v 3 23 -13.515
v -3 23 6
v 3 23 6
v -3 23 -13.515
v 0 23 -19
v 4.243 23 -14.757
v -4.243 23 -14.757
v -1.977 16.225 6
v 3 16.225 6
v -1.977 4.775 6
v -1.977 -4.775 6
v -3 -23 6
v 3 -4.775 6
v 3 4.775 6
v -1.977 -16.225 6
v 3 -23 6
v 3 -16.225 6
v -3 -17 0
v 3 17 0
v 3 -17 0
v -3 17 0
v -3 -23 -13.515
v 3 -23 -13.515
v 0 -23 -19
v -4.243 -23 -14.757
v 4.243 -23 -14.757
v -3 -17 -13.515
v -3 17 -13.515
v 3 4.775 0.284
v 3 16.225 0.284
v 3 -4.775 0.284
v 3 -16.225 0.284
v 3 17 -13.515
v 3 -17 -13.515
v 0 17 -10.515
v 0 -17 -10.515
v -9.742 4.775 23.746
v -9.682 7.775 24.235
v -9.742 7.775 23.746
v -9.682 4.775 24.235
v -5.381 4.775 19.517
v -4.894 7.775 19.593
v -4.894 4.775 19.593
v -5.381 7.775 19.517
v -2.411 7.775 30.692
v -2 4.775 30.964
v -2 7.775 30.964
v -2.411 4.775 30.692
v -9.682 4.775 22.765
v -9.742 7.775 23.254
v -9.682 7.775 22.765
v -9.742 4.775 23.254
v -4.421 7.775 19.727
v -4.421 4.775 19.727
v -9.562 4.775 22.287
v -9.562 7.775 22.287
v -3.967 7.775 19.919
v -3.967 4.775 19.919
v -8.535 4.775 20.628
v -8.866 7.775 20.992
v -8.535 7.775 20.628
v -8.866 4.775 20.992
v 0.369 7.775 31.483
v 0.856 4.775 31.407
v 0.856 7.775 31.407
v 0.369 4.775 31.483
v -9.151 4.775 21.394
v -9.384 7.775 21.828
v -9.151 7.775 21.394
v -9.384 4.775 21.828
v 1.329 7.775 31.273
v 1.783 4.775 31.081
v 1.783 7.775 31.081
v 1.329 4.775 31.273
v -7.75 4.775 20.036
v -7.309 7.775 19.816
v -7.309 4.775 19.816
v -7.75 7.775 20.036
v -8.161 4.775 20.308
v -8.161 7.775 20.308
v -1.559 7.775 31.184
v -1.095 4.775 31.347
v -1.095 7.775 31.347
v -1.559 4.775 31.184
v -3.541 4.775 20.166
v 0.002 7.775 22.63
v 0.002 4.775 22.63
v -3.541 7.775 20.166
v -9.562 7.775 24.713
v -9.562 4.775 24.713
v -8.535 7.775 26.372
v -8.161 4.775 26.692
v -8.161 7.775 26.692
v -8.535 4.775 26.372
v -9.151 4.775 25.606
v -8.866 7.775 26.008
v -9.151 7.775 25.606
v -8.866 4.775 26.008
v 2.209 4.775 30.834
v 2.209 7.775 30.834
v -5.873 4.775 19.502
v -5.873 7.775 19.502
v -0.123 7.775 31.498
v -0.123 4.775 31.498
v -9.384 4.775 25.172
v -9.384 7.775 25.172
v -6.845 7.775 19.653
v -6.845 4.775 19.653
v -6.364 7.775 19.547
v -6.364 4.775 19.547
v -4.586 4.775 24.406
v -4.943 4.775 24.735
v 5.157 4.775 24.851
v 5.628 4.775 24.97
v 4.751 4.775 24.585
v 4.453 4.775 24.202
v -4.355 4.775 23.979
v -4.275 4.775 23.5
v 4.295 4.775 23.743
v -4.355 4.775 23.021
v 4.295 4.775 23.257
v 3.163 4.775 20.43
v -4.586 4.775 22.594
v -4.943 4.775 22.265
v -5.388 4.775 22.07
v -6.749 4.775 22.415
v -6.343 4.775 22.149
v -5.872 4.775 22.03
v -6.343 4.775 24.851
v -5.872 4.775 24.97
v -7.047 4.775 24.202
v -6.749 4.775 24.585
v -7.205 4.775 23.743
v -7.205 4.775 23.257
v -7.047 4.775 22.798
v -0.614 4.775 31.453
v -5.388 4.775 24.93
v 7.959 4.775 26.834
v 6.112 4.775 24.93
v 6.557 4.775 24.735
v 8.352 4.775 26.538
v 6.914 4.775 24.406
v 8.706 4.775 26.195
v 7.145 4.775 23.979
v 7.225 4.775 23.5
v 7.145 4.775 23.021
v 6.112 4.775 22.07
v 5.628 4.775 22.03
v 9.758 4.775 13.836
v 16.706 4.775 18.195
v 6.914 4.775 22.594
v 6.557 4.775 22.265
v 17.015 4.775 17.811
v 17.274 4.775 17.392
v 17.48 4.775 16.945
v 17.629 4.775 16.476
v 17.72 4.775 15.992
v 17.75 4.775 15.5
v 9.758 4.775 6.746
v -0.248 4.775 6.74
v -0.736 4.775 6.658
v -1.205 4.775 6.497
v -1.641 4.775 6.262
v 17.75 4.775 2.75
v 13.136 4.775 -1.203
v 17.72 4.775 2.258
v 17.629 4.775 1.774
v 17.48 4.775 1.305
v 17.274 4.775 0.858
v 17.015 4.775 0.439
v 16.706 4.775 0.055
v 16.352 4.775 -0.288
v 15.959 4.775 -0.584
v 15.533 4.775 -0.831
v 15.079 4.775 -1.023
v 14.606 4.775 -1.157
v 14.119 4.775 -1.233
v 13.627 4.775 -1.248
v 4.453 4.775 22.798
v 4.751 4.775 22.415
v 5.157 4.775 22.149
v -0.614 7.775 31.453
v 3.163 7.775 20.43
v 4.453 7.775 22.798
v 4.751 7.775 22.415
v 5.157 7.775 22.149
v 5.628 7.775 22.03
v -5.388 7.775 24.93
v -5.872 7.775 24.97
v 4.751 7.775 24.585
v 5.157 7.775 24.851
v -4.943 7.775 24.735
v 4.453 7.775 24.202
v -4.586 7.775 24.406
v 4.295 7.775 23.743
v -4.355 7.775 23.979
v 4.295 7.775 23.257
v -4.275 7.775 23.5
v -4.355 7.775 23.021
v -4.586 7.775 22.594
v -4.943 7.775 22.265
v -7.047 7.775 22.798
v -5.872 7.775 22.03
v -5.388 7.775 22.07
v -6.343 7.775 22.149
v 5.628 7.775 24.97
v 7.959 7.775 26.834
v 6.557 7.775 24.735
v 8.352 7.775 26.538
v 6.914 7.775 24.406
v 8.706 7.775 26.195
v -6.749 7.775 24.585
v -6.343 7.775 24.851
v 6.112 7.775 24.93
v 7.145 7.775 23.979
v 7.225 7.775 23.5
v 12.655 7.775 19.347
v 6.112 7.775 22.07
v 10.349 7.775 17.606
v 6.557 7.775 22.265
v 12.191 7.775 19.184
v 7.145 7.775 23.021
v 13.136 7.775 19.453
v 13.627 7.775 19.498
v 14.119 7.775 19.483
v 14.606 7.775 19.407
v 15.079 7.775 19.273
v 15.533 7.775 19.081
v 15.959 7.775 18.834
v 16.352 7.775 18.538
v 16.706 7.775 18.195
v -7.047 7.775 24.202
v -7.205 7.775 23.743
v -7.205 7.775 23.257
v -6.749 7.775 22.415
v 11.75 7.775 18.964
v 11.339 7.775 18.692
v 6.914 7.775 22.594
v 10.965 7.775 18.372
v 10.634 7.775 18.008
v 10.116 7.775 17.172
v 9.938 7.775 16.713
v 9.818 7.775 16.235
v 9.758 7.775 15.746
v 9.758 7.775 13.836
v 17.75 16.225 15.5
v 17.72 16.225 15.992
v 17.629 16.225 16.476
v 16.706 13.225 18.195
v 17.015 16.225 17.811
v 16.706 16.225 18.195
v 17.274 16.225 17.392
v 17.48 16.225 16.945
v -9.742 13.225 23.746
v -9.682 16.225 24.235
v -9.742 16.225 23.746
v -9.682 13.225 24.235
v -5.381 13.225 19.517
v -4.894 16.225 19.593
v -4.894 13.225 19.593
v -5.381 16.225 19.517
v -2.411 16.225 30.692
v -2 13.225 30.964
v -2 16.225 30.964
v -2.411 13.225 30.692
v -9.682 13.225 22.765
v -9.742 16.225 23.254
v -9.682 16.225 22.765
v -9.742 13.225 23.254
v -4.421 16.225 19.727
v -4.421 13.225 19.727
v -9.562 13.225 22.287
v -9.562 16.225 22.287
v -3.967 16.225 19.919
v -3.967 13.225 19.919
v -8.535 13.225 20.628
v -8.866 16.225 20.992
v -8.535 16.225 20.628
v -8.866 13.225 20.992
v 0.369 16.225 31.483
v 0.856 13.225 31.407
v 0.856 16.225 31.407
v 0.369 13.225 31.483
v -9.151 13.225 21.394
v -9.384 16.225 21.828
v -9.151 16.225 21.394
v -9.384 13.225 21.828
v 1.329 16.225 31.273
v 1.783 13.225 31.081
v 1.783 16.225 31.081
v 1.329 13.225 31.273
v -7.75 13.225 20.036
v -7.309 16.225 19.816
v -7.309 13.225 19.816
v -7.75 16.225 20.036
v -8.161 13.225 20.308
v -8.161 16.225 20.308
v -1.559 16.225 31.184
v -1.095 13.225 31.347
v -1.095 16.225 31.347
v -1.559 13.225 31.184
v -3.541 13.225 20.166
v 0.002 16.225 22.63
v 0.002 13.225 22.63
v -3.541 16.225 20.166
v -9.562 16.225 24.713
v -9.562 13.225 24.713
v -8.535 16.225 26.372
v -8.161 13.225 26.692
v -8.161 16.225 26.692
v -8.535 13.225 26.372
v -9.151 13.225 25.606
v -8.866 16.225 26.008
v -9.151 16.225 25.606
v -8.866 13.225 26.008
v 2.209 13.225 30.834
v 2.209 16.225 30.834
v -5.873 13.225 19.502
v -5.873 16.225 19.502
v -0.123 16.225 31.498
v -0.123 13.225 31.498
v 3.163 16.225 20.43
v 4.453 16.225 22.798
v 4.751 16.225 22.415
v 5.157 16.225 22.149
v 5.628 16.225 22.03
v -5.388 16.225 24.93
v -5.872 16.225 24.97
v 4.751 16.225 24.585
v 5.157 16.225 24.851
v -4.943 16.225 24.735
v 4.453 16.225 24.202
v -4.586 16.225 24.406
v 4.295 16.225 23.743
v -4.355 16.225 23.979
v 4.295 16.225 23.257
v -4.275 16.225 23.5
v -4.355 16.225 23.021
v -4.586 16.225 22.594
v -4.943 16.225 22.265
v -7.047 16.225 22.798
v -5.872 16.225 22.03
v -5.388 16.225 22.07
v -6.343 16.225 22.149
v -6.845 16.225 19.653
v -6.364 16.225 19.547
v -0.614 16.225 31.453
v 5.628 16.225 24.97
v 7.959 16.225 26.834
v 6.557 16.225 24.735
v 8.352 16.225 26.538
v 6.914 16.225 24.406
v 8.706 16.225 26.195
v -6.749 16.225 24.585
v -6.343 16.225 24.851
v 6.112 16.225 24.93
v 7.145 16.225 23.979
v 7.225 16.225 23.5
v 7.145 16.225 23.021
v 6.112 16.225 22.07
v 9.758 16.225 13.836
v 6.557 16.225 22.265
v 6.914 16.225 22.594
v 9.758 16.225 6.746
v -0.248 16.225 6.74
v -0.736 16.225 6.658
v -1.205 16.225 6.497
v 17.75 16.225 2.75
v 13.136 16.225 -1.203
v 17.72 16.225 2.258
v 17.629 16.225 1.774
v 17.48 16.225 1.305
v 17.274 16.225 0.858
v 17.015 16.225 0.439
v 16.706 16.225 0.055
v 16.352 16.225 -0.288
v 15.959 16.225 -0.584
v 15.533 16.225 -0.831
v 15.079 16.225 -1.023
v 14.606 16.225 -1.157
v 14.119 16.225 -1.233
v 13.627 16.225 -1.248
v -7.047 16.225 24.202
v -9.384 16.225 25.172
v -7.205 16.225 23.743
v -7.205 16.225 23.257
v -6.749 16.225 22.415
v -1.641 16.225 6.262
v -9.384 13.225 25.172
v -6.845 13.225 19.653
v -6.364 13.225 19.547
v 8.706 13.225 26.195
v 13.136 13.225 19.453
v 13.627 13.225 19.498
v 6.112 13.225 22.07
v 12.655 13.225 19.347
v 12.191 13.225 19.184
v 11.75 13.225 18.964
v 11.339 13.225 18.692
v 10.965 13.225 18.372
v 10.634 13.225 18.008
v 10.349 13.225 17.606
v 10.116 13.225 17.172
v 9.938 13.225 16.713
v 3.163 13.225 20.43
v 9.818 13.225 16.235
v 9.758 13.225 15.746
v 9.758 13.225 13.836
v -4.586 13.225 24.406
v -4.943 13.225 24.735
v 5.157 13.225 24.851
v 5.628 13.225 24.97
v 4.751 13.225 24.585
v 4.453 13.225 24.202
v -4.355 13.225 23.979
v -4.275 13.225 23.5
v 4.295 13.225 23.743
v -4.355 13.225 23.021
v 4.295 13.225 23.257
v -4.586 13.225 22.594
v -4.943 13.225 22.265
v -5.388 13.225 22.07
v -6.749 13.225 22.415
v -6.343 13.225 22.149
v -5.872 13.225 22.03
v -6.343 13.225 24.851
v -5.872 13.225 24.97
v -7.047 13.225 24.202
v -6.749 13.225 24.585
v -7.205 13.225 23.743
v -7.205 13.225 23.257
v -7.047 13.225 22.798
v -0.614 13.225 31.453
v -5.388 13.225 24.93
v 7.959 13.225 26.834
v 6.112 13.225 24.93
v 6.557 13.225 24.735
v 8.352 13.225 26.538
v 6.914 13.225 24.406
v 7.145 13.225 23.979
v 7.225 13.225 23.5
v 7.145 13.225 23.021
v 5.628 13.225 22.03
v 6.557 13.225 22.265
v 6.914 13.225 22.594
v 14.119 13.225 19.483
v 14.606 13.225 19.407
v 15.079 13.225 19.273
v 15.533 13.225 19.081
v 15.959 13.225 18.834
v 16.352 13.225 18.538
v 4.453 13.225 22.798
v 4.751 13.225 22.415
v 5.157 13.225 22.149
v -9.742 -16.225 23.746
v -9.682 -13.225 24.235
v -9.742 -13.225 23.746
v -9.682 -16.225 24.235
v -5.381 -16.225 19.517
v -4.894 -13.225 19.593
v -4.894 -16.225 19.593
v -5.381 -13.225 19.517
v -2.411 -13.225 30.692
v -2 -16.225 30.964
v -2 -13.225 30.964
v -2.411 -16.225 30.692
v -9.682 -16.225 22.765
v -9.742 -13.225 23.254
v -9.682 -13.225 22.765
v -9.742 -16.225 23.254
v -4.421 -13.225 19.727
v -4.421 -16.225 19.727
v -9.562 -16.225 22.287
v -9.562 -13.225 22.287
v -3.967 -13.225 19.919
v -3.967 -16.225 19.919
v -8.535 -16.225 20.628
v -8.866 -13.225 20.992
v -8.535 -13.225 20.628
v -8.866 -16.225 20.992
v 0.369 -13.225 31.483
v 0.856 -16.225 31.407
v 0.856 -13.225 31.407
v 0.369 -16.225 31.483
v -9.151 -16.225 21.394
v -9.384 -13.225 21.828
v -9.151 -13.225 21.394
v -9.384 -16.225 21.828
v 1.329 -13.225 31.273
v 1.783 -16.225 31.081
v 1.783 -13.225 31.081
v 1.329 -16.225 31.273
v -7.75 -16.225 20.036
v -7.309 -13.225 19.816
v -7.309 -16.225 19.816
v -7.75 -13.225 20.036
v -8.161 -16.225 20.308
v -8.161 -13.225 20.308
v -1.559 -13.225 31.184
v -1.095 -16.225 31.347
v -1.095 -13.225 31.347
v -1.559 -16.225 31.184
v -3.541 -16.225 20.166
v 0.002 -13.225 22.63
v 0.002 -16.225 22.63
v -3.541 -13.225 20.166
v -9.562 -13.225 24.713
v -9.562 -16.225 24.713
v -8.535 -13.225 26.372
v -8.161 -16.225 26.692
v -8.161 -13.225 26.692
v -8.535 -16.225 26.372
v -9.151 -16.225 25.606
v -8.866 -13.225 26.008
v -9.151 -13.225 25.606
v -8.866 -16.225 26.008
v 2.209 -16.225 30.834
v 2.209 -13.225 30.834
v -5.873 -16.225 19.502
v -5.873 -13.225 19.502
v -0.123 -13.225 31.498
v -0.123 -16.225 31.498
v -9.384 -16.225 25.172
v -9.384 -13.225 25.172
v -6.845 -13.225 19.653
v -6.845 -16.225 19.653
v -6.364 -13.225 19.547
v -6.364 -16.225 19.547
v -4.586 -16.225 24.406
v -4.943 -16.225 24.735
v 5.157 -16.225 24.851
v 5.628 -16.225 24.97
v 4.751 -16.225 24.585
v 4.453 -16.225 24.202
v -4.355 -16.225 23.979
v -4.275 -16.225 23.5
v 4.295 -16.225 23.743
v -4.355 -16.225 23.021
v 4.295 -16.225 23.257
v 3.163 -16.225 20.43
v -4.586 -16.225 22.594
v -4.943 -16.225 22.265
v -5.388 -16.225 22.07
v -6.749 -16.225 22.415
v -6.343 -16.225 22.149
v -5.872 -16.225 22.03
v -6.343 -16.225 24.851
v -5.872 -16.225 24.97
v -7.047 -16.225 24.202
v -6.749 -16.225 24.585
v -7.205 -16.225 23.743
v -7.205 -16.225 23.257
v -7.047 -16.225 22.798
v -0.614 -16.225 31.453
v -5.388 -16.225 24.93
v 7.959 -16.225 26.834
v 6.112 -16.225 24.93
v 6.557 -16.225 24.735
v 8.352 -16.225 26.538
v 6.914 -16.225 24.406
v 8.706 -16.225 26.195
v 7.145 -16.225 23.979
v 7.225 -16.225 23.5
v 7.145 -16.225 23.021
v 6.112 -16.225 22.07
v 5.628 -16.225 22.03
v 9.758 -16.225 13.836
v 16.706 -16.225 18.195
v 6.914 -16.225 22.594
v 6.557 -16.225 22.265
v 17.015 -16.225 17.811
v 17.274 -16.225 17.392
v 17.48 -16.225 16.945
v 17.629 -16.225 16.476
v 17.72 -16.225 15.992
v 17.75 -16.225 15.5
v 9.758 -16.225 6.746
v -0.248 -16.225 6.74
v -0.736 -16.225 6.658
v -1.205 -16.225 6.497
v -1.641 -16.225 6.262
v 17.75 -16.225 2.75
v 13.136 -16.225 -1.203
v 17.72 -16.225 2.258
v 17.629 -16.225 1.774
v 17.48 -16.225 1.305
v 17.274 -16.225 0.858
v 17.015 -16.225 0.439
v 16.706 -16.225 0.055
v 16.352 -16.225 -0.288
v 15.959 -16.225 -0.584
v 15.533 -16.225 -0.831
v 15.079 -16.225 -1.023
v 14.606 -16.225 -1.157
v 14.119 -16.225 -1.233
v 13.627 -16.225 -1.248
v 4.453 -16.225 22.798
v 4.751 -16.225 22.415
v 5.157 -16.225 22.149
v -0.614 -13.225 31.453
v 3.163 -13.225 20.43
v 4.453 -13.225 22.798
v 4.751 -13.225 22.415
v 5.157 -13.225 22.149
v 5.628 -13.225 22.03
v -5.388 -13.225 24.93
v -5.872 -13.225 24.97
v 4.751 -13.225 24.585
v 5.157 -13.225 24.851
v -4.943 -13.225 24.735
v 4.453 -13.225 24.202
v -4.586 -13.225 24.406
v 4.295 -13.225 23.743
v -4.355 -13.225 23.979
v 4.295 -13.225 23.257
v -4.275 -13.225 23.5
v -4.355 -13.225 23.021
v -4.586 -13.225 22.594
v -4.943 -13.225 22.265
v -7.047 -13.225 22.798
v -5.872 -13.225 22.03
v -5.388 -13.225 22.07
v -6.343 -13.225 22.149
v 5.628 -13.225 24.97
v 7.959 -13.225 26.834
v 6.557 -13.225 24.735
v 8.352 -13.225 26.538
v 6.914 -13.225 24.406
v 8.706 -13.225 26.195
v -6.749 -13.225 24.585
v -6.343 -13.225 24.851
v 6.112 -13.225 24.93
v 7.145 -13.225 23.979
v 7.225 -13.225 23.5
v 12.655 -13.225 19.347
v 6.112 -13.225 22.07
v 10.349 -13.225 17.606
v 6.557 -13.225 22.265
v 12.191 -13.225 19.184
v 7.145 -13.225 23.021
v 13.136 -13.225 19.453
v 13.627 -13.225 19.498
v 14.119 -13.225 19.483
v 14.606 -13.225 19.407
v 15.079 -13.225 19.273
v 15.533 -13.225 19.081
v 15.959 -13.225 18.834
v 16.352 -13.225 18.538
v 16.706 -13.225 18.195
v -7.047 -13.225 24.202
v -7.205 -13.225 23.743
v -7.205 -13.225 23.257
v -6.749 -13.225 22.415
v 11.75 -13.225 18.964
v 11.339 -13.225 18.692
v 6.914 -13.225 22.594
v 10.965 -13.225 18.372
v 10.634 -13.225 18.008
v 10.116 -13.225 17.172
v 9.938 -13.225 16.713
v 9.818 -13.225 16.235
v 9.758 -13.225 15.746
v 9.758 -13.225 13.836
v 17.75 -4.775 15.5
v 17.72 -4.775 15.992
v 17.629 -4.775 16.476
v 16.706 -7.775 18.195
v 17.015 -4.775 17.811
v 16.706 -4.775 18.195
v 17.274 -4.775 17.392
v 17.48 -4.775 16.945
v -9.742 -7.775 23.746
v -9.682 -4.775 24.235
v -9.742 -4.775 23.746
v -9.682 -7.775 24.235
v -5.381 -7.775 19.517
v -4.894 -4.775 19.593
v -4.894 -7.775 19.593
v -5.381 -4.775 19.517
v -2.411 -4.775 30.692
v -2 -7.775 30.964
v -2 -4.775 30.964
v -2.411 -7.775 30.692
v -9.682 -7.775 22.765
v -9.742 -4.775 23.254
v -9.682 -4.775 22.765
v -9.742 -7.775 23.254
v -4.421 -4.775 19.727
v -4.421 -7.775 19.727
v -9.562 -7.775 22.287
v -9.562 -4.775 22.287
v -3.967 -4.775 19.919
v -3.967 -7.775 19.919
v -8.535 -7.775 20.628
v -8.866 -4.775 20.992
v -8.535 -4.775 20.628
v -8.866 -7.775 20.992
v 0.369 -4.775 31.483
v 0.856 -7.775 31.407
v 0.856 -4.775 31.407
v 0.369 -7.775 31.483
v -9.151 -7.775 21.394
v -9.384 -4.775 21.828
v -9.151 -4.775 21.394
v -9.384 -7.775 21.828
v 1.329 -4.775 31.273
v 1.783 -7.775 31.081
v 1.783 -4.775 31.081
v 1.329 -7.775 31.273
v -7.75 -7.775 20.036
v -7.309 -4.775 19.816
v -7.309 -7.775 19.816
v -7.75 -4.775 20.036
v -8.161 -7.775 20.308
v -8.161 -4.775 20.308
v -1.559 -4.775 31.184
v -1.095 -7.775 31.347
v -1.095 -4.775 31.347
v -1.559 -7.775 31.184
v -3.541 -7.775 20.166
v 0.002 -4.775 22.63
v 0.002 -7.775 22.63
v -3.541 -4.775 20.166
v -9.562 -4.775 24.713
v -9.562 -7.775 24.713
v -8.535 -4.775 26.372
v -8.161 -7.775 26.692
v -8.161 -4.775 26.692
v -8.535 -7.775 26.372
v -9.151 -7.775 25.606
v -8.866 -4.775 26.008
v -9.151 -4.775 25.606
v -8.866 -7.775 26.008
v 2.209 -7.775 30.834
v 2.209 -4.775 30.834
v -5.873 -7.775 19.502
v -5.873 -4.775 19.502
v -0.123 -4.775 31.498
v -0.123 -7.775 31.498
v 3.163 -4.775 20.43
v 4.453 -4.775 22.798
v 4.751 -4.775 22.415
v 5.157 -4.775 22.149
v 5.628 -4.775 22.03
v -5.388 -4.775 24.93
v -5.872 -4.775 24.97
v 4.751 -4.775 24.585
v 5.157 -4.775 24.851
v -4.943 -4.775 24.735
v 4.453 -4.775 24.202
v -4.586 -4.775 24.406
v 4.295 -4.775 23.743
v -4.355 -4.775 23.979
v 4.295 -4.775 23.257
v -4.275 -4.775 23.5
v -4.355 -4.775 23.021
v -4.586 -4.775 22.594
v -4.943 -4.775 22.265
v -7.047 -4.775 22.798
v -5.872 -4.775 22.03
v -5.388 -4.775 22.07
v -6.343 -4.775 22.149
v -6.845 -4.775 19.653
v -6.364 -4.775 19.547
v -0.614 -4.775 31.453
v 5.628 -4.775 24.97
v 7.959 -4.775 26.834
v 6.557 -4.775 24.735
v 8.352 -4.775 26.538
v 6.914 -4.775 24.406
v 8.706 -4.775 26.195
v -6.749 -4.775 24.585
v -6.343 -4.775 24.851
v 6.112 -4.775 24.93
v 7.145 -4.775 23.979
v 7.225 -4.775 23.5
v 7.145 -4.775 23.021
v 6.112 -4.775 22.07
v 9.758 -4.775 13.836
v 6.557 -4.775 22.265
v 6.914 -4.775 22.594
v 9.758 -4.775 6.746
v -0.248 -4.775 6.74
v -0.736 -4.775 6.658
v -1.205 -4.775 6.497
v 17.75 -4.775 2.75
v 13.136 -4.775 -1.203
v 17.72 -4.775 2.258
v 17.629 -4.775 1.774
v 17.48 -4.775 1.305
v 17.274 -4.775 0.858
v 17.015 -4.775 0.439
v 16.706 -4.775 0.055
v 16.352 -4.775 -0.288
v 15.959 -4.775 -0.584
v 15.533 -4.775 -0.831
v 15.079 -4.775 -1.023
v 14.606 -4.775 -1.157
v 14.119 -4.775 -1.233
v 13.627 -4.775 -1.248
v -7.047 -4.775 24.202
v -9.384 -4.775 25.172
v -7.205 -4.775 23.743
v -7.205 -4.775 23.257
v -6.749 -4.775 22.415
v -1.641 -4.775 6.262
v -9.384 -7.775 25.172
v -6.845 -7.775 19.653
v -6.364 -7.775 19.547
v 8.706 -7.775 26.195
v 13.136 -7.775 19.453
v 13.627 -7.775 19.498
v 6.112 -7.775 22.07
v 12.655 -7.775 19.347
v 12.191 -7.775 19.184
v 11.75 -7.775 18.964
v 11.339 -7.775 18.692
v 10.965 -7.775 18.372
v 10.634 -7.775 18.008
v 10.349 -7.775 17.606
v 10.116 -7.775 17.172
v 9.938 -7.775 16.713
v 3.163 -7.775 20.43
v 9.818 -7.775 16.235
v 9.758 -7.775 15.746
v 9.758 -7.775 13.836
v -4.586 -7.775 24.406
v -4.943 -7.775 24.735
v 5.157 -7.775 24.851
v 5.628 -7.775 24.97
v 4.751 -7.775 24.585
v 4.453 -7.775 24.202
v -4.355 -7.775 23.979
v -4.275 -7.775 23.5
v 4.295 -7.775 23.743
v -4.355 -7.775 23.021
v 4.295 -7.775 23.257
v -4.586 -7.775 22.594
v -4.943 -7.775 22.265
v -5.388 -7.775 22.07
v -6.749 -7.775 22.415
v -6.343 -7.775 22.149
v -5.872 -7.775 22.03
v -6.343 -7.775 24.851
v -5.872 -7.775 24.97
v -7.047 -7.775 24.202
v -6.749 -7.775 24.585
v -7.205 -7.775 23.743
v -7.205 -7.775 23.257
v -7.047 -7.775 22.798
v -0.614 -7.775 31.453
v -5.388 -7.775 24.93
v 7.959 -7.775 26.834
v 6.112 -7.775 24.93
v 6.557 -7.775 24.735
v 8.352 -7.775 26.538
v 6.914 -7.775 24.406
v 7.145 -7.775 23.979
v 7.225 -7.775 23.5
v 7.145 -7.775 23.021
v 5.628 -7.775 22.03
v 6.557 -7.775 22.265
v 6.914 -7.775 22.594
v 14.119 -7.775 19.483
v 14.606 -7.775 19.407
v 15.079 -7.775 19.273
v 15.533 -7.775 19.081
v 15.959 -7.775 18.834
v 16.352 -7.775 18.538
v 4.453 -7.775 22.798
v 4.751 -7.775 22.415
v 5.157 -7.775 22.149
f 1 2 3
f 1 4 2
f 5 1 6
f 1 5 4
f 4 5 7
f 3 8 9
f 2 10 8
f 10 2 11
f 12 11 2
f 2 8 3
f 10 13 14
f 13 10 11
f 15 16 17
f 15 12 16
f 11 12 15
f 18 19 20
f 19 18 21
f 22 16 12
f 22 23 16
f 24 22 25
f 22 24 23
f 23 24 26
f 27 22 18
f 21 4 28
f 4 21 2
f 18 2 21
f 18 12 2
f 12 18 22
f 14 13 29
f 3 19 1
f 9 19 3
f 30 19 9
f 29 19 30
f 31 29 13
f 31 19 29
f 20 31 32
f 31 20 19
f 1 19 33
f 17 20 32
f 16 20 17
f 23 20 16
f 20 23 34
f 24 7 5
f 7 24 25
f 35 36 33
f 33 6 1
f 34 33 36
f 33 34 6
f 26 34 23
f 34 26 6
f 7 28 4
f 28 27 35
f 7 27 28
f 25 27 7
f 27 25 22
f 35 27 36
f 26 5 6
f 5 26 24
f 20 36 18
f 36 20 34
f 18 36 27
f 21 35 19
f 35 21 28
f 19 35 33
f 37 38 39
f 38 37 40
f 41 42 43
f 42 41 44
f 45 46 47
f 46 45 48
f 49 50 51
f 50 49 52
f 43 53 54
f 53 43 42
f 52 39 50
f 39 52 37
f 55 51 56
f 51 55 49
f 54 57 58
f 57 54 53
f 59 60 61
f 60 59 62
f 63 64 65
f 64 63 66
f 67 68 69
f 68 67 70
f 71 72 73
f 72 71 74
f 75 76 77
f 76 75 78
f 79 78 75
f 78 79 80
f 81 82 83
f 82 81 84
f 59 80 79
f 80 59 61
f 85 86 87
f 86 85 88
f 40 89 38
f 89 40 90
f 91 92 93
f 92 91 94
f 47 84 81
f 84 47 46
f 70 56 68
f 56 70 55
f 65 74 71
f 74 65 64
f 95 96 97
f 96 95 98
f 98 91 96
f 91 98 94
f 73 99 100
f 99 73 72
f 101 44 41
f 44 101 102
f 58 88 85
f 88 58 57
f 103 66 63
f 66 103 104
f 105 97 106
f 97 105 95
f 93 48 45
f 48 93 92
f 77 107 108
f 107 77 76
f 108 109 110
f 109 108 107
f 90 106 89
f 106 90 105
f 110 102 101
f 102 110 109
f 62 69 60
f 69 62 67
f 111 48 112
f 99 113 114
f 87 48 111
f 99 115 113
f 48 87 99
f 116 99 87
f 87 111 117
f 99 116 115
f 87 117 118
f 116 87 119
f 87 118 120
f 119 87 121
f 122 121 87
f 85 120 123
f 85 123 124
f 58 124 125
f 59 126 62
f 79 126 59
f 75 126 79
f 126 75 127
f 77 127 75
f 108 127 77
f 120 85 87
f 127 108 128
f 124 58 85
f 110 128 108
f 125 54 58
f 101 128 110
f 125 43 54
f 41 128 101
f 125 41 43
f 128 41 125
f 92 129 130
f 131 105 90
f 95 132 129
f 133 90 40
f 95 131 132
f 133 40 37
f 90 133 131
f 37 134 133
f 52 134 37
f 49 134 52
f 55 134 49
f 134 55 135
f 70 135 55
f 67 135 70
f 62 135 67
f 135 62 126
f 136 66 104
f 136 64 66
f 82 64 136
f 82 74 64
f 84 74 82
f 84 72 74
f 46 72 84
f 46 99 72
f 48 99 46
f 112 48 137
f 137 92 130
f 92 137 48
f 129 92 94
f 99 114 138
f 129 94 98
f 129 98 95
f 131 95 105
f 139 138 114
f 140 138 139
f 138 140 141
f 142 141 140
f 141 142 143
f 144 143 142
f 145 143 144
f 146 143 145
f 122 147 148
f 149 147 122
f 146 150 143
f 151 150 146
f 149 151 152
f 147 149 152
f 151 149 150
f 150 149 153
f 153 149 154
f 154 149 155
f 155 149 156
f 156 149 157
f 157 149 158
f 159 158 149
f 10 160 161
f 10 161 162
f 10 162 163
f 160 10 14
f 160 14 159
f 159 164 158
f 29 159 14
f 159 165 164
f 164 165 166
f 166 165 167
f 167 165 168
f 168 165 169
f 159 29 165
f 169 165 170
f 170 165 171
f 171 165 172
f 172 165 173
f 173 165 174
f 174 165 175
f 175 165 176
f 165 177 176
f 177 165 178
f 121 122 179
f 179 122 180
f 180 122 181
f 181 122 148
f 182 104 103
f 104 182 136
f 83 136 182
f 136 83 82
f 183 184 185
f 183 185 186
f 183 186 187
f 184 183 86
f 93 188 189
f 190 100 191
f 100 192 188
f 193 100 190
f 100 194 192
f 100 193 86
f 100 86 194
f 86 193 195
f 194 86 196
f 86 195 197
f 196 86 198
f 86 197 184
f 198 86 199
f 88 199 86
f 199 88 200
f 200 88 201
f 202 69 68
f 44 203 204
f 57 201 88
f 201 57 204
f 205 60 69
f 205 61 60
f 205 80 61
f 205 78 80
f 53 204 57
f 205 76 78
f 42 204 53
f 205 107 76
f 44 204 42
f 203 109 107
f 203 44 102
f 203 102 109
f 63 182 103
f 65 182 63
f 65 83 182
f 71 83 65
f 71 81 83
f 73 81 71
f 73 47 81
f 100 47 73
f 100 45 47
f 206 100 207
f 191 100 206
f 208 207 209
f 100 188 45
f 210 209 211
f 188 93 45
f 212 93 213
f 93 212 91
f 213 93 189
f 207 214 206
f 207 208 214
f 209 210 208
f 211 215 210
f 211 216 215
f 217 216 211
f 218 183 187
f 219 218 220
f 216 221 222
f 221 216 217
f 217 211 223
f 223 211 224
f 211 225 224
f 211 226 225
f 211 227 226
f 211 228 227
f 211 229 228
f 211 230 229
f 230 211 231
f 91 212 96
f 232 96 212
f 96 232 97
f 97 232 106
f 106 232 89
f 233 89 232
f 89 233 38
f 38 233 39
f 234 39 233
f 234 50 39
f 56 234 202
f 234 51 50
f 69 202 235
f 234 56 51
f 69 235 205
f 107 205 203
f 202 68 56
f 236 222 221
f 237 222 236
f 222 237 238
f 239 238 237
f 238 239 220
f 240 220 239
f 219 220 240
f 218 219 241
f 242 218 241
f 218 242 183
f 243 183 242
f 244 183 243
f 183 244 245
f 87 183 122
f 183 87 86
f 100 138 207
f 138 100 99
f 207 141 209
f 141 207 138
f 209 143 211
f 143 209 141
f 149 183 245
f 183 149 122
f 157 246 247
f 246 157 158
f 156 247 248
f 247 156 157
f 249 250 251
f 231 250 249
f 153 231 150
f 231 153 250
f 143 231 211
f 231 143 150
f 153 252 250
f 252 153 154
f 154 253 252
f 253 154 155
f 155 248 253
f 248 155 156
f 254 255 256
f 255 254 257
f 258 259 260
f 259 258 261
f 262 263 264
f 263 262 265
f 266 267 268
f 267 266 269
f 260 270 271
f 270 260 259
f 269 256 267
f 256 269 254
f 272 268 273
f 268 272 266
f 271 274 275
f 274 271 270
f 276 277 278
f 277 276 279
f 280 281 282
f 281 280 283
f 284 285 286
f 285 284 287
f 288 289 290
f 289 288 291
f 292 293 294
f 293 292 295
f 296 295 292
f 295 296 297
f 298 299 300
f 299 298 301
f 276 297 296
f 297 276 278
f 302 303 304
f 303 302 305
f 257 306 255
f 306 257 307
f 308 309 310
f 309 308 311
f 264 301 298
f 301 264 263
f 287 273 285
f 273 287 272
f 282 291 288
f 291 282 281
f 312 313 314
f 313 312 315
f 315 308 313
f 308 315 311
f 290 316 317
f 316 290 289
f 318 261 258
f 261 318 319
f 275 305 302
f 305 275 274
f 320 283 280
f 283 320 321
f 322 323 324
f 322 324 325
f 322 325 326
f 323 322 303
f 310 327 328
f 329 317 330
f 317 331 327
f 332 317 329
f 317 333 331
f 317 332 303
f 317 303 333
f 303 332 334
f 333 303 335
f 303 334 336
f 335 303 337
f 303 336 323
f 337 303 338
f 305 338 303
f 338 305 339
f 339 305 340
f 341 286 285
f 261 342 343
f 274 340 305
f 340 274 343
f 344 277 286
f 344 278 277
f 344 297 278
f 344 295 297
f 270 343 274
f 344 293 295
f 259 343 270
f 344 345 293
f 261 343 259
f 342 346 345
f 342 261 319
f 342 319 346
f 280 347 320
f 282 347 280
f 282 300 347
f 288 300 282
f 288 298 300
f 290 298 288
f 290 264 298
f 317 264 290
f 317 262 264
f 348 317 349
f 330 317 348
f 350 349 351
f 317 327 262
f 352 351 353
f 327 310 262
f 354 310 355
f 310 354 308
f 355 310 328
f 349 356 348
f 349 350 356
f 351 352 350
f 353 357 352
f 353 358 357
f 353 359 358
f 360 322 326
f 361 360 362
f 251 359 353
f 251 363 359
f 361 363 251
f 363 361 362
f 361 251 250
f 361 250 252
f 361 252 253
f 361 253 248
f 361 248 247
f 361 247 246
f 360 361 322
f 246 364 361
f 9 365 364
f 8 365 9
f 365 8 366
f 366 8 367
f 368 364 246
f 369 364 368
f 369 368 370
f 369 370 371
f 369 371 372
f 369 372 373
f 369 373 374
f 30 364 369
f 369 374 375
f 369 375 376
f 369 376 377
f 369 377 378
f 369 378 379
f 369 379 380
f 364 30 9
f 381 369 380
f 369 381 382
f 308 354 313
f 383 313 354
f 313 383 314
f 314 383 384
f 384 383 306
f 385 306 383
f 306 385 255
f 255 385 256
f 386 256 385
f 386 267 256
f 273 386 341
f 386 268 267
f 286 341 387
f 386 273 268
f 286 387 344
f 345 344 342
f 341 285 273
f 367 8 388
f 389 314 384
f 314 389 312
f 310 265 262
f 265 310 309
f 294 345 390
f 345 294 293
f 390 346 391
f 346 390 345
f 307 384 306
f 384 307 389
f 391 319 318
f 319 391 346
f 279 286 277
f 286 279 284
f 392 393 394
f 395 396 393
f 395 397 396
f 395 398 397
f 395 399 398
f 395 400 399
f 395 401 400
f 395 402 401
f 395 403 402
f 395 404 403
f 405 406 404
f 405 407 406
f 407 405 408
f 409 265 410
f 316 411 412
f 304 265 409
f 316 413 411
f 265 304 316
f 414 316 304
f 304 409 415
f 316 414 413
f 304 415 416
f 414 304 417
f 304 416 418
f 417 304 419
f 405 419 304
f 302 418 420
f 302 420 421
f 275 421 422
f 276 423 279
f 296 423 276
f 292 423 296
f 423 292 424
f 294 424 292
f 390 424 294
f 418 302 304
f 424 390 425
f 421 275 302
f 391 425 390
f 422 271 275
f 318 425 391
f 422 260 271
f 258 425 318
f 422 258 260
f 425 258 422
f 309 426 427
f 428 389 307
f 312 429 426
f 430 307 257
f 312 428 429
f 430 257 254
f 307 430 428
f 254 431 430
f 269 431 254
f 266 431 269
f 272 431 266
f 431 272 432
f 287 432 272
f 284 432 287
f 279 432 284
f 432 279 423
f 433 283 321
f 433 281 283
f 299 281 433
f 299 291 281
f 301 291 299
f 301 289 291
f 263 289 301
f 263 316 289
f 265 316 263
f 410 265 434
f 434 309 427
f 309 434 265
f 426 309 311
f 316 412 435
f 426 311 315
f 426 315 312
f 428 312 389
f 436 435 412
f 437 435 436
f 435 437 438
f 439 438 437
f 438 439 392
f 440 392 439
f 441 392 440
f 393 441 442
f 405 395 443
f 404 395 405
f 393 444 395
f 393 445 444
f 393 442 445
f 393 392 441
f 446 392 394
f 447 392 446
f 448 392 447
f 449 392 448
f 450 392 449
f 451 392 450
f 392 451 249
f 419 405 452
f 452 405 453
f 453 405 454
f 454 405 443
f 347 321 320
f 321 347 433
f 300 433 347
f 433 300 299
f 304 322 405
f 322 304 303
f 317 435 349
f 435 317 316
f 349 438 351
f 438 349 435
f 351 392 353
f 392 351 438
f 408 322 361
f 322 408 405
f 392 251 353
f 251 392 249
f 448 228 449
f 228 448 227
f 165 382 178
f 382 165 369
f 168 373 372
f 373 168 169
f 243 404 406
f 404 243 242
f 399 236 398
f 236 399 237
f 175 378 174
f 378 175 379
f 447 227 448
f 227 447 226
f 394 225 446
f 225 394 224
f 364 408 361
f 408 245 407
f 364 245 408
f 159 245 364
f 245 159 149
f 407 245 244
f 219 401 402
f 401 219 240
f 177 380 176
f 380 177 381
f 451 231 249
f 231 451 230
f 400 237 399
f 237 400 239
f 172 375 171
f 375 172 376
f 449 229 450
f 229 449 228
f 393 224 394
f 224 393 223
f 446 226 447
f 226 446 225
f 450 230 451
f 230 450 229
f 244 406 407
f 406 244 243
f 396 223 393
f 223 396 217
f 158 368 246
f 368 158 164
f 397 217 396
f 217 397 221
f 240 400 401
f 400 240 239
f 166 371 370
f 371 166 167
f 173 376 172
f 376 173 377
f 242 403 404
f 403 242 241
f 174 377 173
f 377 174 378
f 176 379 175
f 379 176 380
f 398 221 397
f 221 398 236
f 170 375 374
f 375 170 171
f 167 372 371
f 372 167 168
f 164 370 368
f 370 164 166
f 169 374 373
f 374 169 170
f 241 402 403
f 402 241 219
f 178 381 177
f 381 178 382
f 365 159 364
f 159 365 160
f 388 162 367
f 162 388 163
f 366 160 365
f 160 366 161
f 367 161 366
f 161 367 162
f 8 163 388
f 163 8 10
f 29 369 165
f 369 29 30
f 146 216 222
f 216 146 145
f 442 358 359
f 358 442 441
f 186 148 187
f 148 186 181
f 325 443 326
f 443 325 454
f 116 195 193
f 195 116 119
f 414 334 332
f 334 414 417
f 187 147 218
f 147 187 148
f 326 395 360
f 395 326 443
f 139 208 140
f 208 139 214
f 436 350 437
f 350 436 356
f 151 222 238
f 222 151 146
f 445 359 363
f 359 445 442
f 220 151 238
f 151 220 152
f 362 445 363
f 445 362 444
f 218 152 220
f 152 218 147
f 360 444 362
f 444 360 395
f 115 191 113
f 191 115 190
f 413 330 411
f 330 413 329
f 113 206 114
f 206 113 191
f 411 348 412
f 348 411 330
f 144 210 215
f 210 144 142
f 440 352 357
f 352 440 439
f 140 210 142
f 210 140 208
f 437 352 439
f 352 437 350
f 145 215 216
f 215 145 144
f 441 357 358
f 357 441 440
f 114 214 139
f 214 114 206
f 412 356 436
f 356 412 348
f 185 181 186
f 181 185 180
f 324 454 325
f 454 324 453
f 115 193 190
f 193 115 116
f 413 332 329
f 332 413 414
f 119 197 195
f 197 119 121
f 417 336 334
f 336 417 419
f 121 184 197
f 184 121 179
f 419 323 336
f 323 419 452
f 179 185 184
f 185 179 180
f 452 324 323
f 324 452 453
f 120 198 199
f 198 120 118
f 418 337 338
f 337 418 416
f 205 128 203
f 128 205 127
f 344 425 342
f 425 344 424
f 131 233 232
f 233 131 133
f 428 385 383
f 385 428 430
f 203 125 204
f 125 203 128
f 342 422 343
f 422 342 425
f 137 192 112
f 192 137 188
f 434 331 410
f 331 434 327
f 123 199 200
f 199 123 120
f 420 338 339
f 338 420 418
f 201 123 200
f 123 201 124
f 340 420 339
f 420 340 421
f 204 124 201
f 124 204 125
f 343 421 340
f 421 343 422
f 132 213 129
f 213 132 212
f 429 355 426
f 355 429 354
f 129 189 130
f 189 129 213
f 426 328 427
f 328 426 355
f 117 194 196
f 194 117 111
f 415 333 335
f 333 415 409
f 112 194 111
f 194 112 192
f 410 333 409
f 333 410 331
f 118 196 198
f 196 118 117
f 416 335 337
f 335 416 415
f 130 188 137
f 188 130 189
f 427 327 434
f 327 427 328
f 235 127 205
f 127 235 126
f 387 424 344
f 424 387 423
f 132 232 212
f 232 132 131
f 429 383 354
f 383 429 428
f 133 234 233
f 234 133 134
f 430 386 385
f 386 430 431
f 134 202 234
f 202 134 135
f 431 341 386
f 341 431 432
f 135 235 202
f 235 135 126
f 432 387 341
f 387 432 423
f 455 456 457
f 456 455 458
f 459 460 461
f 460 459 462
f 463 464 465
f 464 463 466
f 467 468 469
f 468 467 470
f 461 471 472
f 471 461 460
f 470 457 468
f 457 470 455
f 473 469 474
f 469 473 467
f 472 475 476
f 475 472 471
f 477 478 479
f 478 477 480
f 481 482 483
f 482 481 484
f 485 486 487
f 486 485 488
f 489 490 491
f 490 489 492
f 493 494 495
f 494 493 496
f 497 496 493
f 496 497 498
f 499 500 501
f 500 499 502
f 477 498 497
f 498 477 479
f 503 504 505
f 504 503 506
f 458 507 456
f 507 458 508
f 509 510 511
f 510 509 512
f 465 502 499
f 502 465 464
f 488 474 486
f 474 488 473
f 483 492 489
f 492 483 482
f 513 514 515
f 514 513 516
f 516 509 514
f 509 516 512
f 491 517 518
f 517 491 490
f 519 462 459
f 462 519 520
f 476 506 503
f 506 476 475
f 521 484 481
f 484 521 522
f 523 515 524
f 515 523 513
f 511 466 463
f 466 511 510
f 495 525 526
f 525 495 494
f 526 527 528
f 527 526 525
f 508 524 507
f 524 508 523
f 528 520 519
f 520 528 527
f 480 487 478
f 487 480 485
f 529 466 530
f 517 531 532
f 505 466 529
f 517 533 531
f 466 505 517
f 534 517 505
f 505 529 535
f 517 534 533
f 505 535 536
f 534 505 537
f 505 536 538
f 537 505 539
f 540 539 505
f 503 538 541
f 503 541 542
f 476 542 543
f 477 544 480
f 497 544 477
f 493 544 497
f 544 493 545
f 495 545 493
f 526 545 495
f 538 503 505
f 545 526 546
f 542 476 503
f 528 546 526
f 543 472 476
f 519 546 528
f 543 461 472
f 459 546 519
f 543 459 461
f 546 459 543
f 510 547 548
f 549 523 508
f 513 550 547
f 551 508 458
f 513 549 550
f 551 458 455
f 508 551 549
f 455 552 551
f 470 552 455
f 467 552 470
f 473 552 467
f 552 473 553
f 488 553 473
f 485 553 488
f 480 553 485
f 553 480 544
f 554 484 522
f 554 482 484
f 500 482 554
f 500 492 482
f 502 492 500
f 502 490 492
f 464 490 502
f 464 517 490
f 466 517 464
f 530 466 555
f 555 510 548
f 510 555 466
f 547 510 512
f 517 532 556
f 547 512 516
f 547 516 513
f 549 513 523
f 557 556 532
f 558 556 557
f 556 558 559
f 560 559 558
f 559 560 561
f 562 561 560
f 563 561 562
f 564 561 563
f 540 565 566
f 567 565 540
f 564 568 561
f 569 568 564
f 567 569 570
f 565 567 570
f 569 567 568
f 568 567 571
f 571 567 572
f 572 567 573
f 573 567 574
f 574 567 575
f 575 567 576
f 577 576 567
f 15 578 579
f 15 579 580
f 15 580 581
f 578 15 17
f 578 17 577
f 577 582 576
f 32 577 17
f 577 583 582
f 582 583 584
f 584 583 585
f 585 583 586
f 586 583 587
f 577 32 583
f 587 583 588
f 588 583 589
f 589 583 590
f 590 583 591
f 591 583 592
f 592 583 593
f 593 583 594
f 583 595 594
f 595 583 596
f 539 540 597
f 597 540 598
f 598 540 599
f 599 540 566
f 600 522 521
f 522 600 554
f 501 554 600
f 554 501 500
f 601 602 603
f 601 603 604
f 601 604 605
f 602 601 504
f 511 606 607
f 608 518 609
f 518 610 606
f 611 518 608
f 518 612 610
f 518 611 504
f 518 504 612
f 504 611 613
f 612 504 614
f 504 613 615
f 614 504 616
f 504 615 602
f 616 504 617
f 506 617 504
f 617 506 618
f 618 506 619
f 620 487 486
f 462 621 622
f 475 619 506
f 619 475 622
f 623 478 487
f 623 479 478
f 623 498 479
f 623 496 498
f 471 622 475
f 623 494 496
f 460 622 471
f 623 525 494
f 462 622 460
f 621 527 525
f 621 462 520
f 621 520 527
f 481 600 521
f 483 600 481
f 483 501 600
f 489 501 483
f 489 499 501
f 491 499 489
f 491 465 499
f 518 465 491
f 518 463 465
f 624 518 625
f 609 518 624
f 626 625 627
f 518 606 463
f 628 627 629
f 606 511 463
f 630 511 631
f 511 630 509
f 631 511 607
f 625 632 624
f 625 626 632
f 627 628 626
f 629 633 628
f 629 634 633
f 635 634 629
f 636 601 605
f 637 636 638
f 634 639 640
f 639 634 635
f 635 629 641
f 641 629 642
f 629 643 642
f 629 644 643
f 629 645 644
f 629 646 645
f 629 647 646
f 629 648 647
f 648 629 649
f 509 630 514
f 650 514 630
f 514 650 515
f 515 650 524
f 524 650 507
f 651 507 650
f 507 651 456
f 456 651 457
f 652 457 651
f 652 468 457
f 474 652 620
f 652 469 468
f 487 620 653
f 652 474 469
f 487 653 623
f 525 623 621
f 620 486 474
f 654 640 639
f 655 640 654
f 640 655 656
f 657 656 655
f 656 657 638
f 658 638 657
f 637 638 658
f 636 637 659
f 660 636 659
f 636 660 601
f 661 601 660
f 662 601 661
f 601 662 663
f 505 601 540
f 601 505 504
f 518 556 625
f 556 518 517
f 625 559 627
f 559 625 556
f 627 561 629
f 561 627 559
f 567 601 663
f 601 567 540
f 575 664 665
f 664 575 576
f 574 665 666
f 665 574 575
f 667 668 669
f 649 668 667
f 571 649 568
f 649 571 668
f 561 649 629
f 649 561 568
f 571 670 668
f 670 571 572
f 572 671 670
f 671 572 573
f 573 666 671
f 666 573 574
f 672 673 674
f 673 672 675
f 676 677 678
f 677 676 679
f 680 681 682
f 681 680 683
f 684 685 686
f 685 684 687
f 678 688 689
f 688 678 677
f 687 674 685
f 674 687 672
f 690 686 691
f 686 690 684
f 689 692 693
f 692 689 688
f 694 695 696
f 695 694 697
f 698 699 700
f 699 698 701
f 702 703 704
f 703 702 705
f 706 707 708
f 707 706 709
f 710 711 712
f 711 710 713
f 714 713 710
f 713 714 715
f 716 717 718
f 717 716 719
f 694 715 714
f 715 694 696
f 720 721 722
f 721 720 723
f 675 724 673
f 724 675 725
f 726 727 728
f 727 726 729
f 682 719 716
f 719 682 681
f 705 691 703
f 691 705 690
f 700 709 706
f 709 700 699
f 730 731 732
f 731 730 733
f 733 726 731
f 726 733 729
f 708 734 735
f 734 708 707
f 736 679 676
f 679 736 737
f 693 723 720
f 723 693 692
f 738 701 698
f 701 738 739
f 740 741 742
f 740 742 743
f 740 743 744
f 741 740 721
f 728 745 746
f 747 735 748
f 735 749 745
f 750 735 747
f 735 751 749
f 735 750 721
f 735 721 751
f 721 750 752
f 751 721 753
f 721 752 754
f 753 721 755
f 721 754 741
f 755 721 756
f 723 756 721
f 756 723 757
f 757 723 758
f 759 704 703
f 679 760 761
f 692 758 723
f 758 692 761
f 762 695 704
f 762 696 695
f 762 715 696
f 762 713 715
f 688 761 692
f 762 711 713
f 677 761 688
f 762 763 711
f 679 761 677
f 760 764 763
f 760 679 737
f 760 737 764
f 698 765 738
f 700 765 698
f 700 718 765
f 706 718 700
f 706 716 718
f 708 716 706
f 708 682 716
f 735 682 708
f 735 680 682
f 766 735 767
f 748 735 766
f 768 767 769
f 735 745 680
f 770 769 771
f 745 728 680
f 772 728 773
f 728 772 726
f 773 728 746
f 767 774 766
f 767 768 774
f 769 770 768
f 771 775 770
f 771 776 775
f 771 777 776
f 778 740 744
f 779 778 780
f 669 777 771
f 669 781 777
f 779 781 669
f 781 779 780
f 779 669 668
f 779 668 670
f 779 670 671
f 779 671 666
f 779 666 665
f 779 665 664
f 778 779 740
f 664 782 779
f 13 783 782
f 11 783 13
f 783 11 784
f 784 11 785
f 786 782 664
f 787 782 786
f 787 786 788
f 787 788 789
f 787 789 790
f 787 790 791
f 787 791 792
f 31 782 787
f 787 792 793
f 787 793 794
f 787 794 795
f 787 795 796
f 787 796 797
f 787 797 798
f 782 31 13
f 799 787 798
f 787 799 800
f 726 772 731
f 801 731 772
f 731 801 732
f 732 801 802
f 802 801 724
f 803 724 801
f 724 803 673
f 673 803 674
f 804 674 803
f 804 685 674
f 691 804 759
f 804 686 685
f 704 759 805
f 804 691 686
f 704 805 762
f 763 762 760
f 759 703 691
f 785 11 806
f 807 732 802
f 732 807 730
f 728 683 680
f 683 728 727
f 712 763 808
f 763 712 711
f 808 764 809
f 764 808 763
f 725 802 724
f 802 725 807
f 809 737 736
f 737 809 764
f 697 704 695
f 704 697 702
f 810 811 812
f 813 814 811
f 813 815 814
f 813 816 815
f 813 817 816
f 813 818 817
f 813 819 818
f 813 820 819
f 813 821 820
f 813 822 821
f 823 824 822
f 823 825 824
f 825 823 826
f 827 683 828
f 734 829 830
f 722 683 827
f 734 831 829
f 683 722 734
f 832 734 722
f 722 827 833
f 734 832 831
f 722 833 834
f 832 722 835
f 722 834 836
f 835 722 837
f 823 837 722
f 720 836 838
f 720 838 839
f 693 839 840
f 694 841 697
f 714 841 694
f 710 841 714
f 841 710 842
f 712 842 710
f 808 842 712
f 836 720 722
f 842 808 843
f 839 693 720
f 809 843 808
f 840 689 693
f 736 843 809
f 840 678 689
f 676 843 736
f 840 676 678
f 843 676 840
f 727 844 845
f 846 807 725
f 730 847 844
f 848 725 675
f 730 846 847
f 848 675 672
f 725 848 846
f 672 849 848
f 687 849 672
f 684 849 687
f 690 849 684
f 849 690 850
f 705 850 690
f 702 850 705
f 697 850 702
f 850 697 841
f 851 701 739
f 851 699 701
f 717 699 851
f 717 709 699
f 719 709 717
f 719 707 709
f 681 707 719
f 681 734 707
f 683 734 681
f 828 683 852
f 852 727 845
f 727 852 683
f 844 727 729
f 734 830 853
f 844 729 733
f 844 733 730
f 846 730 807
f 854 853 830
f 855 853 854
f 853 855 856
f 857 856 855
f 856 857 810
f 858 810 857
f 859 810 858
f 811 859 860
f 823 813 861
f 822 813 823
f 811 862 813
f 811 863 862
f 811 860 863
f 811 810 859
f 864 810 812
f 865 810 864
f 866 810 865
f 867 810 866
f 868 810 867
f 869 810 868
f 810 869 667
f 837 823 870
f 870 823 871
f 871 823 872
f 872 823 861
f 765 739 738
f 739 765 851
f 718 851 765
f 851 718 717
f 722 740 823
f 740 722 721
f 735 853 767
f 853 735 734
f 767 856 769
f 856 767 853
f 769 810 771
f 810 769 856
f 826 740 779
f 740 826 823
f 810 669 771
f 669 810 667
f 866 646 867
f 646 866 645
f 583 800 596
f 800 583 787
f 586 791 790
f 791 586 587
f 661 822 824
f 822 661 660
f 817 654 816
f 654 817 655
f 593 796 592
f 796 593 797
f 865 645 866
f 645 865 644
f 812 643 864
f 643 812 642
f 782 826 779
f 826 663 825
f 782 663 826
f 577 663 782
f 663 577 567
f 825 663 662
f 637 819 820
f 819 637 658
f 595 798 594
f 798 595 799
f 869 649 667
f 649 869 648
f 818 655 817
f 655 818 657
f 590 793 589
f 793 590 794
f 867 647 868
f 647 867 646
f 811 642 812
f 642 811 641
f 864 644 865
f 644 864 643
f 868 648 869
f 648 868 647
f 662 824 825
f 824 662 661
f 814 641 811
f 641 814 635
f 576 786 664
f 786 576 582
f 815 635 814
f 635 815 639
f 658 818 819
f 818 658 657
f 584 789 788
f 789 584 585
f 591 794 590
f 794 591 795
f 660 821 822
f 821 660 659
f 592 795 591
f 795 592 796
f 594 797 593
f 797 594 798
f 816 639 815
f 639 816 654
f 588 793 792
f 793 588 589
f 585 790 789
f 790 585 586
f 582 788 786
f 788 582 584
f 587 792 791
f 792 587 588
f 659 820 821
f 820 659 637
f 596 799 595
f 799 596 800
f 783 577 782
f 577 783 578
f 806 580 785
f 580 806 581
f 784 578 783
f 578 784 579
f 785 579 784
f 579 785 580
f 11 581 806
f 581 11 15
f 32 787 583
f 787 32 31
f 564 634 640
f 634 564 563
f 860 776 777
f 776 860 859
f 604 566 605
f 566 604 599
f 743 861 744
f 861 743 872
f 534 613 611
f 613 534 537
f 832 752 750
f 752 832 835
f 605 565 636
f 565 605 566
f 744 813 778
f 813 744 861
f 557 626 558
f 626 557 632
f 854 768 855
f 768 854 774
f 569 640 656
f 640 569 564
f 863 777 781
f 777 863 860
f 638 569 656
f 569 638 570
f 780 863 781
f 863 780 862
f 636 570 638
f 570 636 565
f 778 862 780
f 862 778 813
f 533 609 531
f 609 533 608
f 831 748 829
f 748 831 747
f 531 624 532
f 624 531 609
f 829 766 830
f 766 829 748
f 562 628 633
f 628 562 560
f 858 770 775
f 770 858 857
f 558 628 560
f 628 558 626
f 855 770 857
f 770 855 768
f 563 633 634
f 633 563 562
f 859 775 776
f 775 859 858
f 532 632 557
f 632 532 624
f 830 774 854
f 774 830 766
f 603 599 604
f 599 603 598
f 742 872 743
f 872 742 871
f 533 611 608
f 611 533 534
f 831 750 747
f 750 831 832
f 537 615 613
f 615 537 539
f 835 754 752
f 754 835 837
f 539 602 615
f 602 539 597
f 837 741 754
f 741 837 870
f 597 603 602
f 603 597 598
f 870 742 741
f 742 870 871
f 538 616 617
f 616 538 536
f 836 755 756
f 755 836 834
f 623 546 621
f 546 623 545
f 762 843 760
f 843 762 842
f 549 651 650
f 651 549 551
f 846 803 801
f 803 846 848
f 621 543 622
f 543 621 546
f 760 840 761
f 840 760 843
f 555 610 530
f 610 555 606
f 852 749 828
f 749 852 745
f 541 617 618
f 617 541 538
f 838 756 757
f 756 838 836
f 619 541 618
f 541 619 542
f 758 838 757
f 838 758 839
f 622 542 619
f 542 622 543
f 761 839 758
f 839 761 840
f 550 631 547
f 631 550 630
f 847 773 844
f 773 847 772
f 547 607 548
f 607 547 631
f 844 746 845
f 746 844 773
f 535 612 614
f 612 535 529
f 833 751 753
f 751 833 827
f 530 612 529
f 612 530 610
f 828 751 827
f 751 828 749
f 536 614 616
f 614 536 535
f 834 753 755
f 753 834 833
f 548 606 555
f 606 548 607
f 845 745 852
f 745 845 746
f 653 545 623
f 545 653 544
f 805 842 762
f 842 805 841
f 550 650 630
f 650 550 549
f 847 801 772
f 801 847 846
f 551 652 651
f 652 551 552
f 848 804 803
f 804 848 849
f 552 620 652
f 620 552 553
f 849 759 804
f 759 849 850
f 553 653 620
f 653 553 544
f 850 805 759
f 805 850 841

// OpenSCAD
m3 = 2.95;

r1_extradist = 1.5;
r1 = (10+r1_extradist)/2; // kullager

h1 = 5.15+0.3; 

r2 = 4;

zz = 3;


$fs = 0.5;
$fa = 5.1;

allt();

//krok();

module krok() {
    x1 = 34;
    x2 = 12;
    difference() {
        union() {
            translate([-x1/2 -x2/2,0,0]) cube([32+14, 6, 6]);
             translate([-x1/2 -x2/2,3,-9-6-4]) rotate([45,0,0]) cube([32+14, 6, 6]);
            translate([-x1/2 -x2/2,0,-9-6]) cube([x2/2, 6, 6*3]);
            translate([x1/2 +x2/2-6,0,-9-6]) cube([x2/2, 6, 6*3]);
        }
    }
    
}

module allt() {
    dist = 11+10;
    rotate([0,0,90]) translate([0,-3,0]) krok();
    translate([0,dist/2,23.5]) kul();
    translate([0,-dist/2,23.5]) kul();
    
    // pil
    %translate([0,0,18]) rotate([-90,0,0]) cylinder(d=5.5, h=20);
    %translate([0,-20,16]) rotate([-90,0,0]) cylinder(d=9.3, h=20);
}

module kul() {

    

    
    translate([0,-h1/2]) difference() {
        union() {
            %translate([r1,0,0]) rotate([-90,0,0]) cylinder(r=r1-r1_extradist/2, h=4);
            %translate([-r1,0,0]) rotate([-90,0,0]) cylinder(r=r1-r1_extradist/2, h=4);
            // höger
            hull() {
                translate([0,-zz,4]) rotate([-90,0,0]) cylinder(r=r2, h=zz);
                translate([-r1,-zz,0]) rotate([-90,0,0]) cylinder(r=r2, h=zz);
            }
            hull() {
                translate([r1,-zz,0]) rotate([-90,0,0]) cylinder(r=r2, h=zz);
                translate([0,-zz,4]) rotate([-90,0,0]) cylinder(r=r2, h=zz);
            }
            hull() {
                translate([r1,-zz,0]) rotate([-90,0,0]) cylinder(r=r2, h=zz);
                translate([r1+8,-zz,-8]) rotate([-90,0,0]) cylinder(r=r2, h=zz);
            }
            // vänster
            hull() {
                translate([0,h1,4]) rotate([-90,0,0]) cylinder(r=r2, h=zz);
                translate([-r1,h1,0]) rotate([-90,0,0]) cylinder(r=r2, h=zz);
            }
            hull() {
                translate([r1,h1,0]) rotate([-90,0,0]) cylinder(r=r2, h=zz);
                translate([0,h1,4]) rotate([-90,0,0]) cylinder(r=r2, h=zz);
            }
            hull() {
                translate([r1,h1,0]) rotate([-90,0,0]) cylinder(r=r2, h=zz);
                translate([r1+8,h1,-8]) rotate([-90,0,0]) cylinder(r=r2, h=zz);
            }
            // tjockare
            hull() {
                translate([r1+8,-3,-8]) rotate([-90,0,0]) cylinder(r=r2, h=3+h1+3);
                translate([r1+8,-3,-r1-r2-11]) rotate([-90,0,0]) cylinder(r=r2, h=3+h1+3);
            }
            hull() {
                translate([r1+8,-3,-r1-r2-11]) rotate([-90,0,0]) cylinder(r=r2, h=3+h1+3);
                translate([0,-3,-r1-3-11]) rotate([-90,0,0]) cylinder(r=3, h=3+h1+3);
            }
            
        }
        translate([r1,-20,0]) rotate([-90,0,0]) cylinder(d=m3, h=40);
        translate([-r1,-20,0]) rotate([-90,0,0]) cylinder(d=m3, h=40);
    }
    
}
